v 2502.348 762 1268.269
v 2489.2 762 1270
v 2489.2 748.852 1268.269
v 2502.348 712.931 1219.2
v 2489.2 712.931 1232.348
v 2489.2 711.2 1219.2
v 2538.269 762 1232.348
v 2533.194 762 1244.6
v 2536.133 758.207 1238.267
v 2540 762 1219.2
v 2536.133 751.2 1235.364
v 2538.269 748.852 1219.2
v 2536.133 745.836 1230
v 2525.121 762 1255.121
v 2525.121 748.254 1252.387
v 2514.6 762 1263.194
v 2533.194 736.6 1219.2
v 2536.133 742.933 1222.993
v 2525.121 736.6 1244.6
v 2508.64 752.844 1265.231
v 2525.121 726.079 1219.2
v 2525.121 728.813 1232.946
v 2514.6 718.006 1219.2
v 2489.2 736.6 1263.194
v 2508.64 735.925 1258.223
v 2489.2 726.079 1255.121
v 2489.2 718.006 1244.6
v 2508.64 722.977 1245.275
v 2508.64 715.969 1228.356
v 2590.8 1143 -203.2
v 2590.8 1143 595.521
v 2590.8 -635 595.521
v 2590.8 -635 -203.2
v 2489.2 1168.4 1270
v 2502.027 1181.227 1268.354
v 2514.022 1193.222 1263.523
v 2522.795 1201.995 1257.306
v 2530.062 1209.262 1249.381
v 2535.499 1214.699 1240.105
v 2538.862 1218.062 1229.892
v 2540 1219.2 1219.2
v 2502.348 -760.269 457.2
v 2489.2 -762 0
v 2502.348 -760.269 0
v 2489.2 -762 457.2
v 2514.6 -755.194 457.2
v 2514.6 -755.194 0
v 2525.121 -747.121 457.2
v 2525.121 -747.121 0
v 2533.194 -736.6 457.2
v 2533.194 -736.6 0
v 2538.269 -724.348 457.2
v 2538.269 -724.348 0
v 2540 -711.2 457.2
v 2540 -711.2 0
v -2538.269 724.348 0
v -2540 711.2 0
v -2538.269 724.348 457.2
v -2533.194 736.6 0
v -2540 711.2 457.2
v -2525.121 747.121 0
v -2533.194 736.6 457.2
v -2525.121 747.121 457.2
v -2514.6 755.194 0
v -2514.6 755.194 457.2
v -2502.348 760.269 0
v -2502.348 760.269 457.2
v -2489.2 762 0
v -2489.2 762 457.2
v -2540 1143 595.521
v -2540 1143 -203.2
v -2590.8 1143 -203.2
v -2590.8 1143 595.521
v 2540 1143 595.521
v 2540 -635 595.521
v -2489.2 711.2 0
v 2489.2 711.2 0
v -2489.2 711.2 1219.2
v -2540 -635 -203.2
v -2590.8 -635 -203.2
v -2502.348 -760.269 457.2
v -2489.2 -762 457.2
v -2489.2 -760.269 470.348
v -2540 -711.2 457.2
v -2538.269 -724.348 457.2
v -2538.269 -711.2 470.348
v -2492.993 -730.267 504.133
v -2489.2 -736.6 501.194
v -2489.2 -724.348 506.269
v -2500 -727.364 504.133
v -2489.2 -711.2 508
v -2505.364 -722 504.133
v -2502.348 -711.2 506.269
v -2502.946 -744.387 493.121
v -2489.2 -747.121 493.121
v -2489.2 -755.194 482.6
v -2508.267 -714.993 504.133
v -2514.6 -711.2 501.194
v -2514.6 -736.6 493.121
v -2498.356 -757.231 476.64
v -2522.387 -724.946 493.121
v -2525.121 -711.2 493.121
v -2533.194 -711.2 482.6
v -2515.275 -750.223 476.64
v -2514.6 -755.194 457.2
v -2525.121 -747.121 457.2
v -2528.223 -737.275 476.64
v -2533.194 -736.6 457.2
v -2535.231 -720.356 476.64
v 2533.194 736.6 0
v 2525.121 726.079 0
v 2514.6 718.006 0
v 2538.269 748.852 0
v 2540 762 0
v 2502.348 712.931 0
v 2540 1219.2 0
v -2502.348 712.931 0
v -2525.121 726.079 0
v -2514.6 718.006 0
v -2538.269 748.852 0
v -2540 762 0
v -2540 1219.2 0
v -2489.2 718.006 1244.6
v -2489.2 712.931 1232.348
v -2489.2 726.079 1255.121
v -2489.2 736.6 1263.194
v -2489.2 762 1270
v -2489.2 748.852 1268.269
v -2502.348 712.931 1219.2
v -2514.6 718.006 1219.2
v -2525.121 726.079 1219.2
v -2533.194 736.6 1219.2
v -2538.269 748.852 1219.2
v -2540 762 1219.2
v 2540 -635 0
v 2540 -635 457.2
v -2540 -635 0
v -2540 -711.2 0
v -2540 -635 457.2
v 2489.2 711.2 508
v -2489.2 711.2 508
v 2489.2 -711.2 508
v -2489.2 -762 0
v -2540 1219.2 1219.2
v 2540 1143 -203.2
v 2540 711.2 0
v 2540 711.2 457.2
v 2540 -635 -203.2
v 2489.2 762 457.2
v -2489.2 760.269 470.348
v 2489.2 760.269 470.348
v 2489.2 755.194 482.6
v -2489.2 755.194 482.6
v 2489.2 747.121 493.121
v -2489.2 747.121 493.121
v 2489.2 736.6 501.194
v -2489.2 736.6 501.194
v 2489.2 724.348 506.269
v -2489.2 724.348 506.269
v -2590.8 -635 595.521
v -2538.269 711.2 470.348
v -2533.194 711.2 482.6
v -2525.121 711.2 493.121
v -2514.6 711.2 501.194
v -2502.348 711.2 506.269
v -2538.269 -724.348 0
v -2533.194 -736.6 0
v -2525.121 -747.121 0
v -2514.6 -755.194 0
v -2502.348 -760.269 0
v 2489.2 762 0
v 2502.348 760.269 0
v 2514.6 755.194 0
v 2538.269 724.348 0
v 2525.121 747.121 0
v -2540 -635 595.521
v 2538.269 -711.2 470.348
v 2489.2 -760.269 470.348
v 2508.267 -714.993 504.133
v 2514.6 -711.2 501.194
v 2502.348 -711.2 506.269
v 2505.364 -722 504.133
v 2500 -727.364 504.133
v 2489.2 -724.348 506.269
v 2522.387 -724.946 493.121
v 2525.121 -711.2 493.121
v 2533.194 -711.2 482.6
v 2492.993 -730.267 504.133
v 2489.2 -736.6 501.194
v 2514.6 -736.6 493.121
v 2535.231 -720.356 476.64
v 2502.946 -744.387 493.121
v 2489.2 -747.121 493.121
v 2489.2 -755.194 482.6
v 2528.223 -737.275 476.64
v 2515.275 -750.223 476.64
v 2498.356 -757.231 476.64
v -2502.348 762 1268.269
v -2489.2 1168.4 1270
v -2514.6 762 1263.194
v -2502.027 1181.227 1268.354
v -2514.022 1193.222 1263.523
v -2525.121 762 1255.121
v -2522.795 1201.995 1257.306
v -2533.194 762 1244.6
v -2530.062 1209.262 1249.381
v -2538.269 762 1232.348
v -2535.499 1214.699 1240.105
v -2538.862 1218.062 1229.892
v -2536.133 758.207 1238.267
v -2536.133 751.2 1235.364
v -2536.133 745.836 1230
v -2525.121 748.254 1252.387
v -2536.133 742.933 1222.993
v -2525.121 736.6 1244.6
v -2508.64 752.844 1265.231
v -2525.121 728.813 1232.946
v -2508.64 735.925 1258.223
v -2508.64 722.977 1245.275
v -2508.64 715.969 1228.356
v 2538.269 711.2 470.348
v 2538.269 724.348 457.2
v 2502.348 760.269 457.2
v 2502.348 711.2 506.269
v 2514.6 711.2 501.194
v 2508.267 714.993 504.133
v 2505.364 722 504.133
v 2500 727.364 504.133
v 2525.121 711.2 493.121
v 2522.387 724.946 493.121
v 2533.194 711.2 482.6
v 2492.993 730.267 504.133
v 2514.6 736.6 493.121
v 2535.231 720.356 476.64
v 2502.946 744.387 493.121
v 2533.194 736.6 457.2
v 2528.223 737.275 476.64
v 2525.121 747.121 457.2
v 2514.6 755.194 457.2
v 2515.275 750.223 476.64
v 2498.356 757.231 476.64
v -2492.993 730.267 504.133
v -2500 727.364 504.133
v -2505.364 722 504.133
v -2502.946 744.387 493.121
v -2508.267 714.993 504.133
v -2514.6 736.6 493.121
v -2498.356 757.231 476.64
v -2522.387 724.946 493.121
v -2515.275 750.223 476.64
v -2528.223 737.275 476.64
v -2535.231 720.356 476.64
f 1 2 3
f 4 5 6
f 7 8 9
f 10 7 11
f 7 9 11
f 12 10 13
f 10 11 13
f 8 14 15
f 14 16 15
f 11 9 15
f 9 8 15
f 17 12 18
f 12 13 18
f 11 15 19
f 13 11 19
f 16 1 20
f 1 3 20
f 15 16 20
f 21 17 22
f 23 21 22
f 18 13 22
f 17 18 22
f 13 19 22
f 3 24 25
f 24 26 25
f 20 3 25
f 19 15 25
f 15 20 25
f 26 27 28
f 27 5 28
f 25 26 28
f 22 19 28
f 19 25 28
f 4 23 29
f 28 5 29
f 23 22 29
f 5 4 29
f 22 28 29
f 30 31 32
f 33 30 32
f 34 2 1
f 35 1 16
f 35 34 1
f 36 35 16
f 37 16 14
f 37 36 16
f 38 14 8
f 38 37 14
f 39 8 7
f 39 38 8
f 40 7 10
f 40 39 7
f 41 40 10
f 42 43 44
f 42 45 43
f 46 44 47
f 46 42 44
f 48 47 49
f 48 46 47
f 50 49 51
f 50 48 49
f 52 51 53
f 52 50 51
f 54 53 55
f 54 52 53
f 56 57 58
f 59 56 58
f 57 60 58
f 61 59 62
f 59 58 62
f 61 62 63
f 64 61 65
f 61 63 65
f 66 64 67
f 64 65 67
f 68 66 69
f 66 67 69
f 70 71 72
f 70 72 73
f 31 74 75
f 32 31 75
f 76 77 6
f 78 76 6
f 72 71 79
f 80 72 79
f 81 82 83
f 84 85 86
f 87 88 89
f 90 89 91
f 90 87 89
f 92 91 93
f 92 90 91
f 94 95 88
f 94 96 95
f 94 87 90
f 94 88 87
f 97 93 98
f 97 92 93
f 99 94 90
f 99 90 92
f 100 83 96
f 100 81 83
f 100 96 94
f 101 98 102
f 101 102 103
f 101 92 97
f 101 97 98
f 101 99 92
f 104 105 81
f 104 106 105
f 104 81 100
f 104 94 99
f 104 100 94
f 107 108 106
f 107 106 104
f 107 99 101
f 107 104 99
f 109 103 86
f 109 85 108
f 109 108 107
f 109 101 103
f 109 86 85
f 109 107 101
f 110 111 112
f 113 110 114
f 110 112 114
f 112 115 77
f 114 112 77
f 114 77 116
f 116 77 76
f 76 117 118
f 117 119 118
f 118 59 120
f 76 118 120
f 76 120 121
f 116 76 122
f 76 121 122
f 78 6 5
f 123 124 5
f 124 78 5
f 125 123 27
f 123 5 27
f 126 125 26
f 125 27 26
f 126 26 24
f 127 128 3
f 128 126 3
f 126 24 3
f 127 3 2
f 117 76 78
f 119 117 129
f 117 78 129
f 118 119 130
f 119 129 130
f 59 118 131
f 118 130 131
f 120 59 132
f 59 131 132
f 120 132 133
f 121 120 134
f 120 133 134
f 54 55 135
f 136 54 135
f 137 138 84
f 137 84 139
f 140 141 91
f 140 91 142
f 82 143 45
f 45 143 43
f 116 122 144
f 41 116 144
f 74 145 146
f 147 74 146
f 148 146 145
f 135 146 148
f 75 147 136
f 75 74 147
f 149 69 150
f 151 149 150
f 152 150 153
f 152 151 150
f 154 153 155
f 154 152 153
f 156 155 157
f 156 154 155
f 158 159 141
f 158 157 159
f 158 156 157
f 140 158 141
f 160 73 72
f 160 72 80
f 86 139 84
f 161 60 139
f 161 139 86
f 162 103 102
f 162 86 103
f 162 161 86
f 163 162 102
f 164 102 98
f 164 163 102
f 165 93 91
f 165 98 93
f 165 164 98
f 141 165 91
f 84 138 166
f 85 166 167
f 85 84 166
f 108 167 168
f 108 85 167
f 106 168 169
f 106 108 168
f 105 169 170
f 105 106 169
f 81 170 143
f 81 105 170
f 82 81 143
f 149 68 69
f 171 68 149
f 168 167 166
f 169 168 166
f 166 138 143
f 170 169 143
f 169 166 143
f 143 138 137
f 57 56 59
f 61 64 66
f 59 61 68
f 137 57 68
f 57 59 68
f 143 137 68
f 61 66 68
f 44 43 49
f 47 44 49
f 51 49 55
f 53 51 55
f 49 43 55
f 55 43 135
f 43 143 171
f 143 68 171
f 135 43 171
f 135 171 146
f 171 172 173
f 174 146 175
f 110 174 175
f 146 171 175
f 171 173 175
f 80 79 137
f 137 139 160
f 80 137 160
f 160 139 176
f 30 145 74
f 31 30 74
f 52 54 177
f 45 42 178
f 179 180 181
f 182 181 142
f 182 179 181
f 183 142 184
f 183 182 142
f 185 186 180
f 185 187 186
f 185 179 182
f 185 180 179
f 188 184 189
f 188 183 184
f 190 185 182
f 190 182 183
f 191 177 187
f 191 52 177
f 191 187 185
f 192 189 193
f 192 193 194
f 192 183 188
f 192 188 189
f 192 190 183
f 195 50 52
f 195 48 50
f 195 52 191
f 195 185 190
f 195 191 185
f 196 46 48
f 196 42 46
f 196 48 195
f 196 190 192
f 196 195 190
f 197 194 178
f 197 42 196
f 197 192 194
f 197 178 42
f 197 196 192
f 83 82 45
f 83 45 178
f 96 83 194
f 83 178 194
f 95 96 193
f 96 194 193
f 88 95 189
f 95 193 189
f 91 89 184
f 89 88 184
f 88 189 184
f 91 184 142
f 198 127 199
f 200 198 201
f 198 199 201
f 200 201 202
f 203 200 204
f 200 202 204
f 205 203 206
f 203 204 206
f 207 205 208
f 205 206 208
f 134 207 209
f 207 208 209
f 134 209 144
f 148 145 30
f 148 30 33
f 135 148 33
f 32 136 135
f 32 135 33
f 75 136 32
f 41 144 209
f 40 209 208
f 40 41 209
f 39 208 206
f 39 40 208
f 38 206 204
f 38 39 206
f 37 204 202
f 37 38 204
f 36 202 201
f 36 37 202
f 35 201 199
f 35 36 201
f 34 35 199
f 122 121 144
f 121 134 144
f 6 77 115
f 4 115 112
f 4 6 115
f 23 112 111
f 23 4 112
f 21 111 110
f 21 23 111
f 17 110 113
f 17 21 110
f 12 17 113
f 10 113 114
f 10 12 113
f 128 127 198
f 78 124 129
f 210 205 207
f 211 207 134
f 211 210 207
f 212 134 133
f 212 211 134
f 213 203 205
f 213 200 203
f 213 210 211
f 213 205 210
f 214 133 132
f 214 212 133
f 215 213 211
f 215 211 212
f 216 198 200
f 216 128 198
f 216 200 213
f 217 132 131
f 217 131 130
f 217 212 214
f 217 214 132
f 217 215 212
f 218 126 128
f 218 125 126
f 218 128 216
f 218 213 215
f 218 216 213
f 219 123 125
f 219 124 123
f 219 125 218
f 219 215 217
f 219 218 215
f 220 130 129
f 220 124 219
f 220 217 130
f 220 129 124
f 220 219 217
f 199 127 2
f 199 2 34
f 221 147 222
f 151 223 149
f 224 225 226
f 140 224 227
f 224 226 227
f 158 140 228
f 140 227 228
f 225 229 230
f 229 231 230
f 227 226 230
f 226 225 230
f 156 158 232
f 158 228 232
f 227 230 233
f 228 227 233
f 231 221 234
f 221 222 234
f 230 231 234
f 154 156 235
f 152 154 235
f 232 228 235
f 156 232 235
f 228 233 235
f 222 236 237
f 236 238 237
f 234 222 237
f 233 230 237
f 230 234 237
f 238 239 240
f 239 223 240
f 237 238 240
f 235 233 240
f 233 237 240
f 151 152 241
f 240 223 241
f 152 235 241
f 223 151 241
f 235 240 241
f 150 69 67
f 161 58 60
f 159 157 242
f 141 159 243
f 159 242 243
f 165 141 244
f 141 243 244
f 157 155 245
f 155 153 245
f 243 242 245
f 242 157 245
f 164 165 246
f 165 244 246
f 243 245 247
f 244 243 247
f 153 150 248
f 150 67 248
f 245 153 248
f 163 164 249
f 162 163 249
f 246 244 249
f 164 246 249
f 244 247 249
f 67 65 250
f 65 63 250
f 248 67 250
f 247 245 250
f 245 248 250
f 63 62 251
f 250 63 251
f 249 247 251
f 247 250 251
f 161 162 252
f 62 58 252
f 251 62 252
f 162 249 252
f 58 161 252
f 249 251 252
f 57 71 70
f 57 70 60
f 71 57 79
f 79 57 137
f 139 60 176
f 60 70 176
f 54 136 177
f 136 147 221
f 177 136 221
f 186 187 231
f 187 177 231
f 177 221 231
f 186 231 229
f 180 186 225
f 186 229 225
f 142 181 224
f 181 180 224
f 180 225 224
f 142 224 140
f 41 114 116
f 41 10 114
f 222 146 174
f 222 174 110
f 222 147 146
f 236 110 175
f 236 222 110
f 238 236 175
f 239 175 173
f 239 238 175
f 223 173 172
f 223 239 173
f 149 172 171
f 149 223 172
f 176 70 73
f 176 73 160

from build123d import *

# Parameters (mm, degrees)
F0_W     = 5080
F0_H     = 1524
F1_DEPTH = 508
F2_R     = 50.8
F3_W     = 1778
F3_H     = 798.7206512661
F4_DEPTH = 50.8
F6_W     = 508
F6_H     = 1270
F7_DEPTH = 5080
F8_R     = 50.8


with BuildPart() as f1:
    # F0 (on Top) → F1 (new body)
    with BuildSketch(Plane.XY):
        Rectangle(F0_W, F0_H)
    extrude(amount=F1_DEPTH)

    # F2
    f2_edges = [f1.edges().sort_by_distance(p)[0] for p in [
        (-2540, 762, 254),
        (-2540, -762, 254),
        (2540, -762, 254),
        (2540, 762, 254),
        (2540, 0, 508),
        (0, -762, 508),
        (0, 762, 508),
        (-2540, 0, 508),
    ]]
    fillet(f2_edges, radius=F2_R)



with BuildPart() as f4:
    # F3 (on face) → F4 (new body)
    with BuildSketch(Plane(origin=(-2540, 0, 0), x_dir=(0, -1, 0), z_dir=(-1, 0, 0))):
        with Locations((-254, 196.1603256331)):
            Rectangle(F3_W, F3_H)
    extrude(amount=F4_DEPTH)


with BuildPart() as f1_1:
    add(f1.part)

    add(f4.part)  # F5 merges F4
    # F5: F4 across plane
    add(f4.part.mirror(Plane.YZ))


with BuildPart() as f7:
    # F6 (on face) → F7 (new body)
    with BuildSketch(Plane.YZ.offset(-2540)):
        with Locations((965.2, 635)):
            Rectangle(F6_W, F6_H)
    extrude(amount=F7_DEPTH)

    # F8
    f8_edges = [f7.edges().sort_by_distance(p)[0] for p in [
        (0, 711.2, 1270),
        (0, 1219.2, 1270),
        (2540, 965.2, 1270),
        (-2540, 965.2, 1270),
        (-2540, 711.2, 635),
        (2540, 711.2, 635),
    ]]
    fillet(f8_edges, radius=F8_R)


solid = Compound([f1_1.part, f7.part])
